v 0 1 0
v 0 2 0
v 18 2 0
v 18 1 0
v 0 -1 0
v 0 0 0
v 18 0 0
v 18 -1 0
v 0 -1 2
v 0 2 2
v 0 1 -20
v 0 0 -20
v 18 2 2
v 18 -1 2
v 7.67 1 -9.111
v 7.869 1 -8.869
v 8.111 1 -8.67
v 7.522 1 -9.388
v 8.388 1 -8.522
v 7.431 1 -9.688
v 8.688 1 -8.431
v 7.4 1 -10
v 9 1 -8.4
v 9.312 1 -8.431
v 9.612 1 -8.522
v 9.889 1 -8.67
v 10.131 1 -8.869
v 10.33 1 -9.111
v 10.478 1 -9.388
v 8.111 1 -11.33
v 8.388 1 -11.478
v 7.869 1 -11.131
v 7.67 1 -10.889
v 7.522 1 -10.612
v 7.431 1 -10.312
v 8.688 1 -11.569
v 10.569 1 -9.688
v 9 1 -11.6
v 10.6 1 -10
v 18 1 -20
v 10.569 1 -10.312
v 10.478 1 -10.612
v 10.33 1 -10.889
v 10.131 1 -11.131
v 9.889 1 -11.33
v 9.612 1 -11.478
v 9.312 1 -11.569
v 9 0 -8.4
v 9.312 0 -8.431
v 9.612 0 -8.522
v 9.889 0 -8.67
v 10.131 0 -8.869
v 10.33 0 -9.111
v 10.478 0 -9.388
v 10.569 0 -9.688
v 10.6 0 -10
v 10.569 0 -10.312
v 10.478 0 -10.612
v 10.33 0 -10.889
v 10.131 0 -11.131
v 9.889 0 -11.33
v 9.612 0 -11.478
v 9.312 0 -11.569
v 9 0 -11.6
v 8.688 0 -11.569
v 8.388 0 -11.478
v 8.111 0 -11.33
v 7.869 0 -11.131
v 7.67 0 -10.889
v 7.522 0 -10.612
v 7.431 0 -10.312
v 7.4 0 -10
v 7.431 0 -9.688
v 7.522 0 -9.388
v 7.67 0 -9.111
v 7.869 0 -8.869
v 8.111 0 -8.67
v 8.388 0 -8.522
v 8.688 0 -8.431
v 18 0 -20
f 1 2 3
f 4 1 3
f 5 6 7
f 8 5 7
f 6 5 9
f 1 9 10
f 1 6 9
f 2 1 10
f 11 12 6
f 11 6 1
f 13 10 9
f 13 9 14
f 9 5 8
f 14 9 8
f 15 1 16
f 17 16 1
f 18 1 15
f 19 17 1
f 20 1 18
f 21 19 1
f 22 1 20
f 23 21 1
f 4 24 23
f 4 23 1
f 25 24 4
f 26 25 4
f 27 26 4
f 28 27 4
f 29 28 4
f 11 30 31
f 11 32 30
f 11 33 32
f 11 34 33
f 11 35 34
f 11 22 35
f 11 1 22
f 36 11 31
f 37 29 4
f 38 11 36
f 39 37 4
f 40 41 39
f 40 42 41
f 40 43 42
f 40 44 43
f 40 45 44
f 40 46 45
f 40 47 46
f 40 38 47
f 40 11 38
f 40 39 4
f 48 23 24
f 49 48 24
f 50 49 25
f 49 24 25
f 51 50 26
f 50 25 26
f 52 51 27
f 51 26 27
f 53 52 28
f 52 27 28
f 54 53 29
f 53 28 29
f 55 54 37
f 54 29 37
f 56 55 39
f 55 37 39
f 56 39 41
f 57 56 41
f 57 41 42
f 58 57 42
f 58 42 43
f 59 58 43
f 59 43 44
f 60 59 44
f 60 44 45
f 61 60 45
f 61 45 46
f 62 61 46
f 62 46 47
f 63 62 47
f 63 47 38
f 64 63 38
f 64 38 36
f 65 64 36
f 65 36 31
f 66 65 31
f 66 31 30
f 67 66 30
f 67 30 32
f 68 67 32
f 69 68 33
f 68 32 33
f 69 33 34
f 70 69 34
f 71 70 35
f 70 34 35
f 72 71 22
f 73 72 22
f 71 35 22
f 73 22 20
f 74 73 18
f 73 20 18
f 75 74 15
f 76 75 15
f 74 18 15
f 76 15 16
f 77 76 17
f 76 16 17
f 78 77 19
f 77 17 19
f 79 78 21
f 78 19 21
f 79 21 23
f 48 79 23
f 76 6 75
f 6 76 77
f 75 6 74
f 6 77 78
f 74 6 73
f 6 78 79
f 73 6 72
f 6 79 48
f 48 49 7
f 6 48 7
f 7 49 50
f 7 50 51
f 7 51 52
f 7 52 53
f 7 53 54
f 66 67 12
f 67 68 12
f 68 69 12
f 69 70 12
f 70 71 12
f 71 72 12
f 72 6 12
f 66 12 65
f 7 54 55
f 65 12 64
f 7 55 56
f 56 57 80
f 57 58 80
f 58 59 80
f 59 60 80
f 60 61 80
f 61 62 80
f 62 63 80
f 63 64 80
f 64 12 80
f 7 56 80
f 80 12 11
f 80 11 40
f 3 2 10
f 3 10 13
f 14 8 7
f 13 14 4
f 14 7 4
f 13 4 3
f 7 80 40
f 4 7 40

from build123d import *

# Parameters (mm, degrees)
SKETCH1_W           = 18
SKETCH1_H           = 20
BOSS_EXTRUDE1_DEPTH = 1
SKETCH2_W           = 18
SKETCH2_H           = 3
BOSS_EXTRUDE2_DEPTH = 2
SKETCH3_R           = 1.6
CUT_EXTRUDE1_DEPTH  = 27.981475126


with BuildPart() as part:
    # Sketch1 → Boss-Extrude1 (new body)
    with BuildSketch(Plane(origin=(0, 0, 0), x_dir=(1, 0, 0), z_dir=(0, 1, 0))):
        with Locations((9, 10)):
            Rectangle(SKETCH1_W, SKETCH1_H)
    extrude(amount=BOSS_EXTRUDE1_DEPTH)

    # Sketch2 → Boss-Extrude2 (add)
    with BuildSketch(Plane.XY):
        with Locations((9, 0.5)):
            Rectangle(SKETCH2_W, SKETCH2_H)
    extrude(amount=BOSS_EXTRUDE2_DEPTH)

    # Sketch3 → Cut-Extrude1 (cut, through all)
    with BuildSketch(Plane(origin=(0, 1, 0), x_dir=(1, 0, 0), z_dir=(0, 1, 0))):
        with Locations(Location((9, 10, 0), (0, 0, 270))):
            Circle(SKETCH3_R)
    extrude(amount=-CUT_EXTRUDE1_DEPTH, mode=Mode.SUBTRACT)


solid = part.part
